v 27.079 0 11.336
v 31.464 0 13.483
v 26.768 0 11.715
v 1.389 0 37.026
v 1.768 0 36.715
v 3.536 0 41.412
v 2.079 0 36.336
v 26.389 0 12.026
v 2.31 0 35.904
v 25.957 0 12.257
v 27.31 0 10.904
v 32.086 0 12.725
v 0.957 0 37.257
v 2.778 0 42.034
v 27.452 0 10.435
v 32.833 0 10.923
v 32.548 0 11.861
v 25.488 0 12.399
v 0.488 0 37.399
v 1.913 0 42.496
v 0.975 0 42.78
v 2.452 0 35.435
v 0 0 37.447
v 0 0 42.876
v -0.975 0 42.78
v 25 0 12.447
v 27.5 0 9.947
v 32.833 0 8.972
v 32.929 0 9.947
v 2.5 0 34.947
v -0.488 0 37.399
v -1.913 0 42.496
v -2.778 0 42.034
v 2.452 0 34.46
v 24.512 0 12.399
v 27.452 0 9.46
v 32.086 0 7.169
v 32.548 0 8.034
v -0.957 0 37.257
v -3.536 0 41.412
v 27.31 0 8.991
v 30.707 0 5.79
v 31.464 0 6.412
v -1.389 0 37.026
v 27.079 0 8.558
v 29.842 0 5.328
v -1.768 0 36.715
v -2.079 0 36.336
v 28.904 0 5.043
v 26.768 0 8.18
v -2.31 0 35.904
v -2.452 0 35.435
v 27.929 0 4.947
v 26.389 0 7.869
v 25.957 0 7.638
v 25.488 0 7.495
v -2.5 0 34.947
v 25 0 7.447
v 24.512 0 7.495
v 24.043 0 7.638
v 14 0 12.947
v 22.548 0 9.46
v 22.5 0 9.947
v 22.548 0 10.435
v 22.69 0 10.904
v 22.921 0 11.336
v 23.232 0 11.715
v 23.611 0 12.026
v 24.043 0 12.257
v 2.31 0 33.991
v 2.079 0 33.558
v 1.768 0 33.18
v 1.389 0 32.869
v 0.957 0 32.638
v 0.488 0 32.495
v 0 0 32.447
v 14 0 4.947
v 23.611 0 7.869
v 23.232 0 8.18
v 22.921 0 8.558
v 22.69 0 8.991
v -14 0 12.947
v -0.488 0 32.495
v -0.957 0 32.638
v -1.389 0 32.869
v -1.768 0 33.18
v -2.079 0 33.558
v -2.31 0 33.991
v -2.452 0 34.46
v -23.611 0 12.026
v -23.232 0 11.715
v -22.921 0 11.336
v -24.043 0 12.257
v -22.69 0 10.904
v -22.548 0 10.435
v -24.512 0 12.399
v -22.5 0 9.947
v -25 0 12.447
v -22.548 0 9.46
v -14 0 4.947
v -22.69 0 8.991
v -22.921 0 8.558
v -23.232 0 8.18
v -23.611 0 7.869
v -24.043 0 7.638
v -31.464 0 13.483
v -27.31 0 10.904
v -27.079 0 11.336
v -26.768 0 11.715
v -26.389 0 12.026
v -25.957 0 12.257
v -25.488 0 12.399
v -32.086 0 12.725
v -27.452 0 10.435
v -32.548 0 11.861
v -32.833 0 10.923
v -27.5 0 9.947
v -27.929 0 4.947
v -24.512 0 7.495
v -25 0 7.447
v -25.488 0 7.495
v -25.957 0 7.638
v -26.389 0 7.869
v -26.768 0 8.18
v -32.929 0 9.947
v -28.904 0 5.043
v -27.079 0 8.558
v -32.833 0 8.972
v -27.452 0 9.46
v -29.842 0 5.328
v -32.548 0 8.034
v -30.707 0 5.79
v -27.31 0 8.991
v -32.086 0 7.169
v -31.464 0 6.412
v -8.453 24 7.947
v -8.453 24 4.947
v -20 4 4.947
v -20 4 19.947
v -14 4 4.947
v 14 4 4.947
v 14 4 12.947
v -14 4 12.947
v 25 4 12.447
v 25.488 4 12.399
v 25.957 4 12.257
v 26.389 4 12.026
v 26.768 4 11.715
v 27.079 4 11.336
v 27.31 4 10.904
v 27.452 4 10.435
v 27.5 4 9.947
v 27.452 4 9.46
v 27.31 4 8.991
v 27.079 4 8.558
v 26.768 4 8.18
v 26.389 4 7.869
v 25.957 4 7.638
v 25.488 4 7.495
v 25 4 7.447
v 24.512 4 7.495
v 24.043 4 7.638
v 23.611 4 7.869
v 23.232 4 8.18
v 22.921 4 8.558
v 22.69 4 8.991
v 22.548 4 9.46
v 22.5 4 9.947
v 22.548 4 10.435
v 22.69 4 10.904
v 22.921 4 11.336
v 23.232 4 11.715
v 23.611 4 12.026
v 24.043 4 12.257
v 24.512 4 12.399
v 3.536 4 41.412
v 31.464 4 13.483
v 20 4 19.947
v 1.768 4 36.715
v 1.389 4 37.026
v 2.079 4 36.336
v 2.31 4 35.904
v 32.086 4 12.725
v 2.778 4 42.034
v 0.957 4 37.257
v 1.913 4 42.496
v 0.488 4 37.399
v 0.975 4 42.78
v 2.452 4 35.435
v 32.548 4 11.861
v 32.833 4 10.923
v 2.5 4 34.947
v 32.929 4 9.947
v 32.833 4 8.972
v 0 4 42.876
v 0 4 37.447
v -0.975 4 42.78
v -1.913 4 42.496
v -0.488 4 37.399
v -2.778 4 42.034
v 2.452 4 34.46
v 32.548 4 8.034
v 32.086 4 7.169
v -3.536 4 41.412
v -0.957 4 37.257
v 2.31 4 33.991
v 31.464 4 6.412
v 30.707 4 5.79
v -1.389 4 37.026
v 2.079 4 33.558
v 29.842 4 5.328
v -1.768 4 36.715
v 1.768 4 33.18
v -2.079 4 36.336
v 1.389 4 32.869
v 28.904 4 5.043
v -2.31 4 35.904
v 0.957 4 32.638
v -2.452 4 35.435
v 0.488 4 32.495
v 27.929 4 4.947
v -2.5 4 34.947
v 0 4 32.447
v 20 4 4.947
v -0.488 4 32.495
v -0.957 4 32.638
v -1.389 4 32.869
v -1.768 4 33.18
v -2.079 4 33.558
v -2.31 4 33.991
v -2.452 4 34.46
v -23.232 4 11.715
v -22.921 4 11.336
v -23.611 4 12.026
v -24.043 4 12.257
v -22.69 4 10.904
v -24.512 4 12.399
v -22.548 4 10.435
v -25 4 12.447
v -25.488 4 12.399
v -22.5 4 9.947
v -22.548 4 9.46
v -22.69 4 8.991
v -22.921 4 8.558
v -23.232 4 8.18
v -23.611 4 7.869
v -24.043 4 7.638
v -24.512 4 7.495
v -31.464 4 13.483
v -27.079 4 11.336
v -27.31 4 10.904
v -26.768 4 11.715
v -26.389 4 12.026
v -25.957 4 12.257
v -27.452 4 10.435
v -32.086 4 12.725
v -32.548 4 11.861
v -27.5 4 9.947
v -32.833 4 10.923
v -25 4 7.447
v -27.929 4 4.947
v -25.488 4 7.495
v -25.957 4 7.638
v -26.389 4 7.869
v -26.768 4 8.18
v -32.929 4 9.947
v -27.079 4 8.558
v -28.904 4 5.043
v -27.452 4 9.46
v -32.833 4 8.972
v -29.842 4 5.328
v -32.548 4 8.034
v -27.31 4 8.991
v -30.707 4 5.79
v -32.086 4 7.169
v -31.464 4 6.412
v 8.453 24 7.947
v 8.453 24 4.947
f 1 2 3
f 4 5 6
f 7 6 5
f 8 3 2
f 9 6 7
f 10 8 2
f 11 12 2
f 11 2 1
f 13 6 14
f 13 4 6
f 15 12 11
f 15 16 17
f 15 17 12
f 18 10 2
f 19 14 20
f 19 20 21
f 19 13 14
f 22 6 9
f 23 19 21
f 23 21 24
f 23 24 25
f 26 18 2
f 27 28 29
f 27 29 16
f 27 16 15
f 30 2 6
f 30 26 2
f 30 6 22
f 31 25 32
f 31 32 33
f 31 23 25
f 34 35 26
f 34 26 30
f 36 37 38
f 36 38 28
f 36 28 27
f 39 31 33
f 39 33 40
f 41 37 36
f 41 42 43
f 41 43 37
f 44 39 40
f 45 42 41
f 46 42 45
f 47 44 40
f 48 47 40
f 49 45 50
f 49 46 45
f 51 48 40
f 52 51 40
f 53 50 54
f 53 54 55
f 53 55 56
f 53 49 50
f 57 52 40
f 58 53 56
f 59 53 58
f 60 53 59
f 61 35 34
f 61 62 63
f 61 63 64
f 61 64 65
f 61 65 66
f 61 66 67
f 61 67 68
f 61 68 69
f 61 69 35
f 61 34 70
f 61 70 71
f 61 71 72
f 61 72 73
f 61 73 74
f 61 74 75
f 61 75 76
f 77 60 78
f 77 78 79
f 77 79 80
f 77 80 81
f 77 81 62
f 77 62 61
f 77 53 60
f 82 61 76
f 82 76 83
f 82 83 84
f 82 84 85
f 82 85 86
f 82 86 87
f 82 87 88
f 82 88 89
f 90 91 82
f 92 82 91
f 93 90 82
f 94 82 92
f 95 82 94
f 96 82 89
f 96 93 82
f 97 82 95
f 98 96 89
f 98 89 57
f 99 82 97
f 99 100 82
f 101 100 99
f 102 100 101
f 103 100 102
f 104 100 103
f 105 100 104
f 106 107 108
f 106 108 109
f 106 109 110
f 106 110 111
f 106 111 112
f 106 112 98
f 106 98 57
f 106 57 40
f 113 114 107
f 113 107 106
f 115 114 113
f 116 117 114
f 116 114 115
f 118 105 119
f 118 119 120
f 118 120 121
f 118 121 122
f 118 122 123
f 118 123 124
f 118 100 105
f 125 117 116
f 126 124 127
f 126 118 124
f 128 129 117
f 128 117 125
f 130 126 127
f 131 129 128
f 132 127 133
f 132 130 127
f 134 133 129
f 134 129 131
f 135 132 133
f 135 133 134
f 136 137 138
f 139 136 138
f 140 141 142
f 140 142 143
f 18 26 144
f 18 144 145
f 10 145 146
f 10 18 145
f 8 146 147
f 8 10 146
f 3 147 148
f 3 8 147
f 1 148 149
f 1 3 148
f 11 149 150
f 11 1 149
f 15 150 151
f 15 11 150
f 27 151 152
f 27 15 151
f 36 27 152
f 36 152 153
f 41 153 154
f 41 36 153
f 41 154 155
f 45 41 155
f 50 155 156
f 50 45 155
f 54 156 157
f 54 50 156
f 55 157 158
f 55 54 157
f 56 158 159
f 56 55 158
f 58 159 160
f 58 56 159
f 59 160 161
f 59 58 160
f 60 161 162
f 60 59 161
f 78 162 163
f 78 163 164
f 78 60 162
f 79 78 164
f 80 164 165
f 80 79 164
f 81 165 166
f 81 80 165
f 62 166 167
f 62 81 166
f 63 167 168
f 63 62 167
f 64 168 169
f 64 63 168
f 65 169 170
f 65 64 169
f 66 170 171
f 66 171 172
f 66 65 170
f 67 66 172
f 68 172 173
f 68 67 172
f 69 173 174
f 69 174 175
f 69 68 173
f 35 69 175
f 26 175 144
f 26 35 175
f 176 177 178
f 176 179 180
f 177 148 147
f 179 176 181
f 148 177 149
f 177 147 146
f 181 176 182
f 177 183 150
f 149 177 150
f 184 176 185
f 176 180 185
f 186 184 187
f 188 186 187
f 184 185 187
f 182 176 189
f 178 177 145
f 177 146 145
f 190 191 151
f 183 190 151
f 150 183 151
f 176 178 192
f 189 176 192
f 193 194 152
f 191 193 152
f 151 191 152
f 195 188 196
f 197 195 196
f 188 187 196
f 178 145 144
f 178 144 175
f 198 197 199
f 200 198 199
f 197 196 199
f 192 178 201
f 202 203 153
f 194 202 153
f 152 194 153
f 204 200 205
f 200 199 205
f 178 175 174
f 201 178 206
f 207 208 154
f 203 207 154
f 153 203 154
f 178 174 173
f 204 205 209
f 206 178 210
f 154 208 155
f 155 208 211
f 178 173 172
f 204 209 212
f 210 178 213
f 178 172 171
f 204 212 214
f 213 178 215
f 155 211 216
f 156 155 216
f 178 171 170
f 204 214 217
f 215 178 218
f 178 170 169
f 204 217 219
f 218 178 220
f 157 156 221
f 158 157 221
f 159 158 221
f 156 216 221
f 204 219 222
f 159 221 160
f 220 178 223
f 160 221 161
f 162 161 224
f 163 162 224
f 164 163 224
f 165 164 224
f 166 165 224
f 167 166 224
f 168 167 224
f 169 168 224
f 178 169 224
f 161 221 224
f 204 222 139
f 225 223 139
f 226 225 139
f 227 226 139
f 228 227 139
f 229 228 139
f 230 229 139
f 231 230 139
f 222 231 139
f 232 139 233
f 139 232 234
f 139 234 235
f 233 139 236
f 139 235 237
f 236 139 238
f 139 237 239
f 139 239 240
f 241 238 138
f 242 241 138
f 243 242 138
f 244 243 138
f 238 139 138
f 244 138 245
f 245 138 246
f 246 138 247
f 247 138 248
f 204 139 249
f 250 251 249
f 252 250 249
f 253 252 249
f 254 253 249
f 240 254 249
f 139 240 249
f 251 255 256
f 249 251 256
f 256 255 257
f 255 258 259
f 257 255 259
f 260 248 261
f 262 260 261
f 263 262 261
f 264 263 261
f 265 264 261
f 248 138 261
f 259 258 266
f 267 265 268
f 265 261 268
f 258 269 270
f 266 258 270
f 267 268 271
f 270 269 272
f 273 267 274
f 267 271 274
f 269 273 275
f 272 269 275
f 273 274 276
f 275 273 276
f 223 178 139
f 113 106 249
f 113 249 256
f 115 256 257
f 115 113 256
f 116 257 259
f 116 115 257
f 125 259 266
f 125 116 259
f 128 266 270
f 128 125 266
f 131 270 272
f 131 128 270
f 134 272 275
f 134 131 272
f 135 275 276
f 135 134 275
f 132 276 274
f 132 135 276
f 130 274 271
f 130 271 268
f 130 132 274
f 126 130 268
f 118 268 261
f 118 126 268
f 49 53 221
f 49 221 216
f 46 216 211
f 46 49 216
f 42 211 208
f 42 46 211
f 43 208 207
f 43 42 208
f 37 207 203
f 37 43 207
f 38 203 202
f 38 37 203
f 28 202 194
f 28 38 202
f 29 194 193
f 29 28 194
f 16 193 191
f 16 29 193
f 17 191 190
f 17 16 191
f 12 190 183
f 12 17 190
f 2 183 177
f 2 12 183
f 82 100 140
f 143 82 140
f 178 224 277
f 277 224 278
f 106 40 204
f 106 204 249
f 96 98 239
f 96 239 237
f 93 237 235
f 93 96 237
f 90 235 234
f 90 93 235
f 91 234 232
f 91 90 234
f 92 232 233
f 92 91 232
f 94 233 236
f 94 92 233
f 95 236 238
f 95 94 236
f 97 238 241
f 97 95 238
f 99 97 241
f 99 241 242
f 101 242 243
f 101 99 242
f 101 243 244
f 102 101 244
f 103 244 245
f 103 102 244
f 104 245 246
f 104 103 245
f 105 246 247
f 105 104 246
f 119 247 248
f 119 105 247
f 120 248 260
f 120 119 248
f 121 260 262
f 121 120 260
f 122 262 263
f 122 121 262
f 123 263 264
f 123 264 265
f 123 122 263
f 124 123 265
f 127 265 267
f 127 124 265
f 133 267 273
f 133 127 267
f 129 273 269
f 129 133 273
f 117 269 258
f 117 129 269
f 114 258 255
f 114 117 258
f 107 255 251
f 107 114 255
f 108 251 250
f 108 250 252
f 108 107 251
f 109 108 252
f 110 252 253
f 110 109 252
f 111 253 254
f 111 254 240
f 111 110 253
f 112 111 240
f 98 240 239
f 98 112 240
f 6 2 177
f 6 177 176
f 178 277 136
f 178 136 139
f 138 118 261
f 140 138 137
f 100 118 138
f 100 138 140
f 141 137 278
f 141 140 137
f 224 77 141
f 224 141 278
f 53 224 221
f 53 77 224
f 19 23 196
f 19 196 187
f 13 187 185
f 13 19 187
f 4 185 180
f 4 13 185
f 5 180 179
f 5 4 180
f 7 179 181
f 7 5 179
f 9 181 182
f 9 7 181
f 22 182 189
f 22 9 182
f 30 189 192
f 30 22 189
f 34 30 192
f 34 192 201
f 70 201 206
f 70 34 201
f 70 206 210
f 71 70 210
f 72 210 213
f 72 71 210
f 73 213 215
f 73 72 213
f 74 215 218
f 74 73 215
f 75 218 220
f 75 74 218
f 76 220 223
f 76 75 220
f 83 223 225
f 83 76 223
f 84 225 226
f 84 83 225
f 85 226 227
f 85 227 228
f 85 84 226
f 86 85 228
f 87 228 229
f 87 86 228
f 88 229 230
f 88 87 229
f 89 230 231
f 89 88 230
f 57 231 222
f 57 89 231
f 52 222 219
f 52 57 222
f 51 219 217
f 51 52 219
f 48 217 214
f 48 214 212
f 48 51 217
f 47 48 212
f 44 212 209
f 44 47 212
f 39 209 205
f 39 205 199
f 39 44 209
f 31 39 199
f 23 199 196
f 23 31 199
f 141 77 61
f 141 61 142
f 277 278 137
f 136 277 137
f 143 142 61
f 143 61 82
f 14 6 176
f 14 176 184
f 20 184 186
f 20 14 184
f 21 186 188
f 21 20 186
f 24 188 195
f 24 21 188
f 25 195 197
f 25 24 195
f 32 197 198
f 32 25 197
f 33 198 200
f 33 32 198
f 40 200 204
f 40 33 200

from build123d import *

# Parameters (mm, degrees)
SKETCH_1_R               = 2.5
EXTRUDE_1_DEPTH          = 4
EXTRUDE_2_DEPTH          = 15
SKETCH_3_W               = 28
SKETCH_3_H               = 4
CUT_EXTRUDE_1_DEPTH      = 8
CUT_EXTRUDE_2_DEPTH      = 60.149678768
CUT_EXTRUDE_2_DEPTH_BACK = 60.149678768


with BuildPart() as part:
    # 草图1 → 凸台-拉伸1 (new body)
    with BuildSketch(Plane(origin=(0, 0, 0), x_dir=(1, 0, 0), z_dir=(0, 1, 0))):
        with BuildLine():
            Line((-27.928932188, -4.947284101), (27.928932188, -4.947284101))
            ThreePointArc((27.928932188, -4.947284101), (32.548329851, -8.03386694), (31.464466094, -13.482818007))
            Line((31.464466094, -13.482818007), (3.535533906, -41.411750195))
            ThreePointArc((3.535533906, -41.411750195), (0, -42.87621629), (-3.535533906, -41.411750195))
            Line((-3.535533906, -41.411750195), (-31.464466094, -13.482818007))
            ThreePointArc((-31.464466094, -13.482818007), (-32.548329851, -8.03386694), (-27.928932188, -4.947284101))
        make_face()
        with Locations(Location((-25, -9.947284101, 0), (0, 0, 270))):
            Circle(SKETCH_1_R, mode=Mode.SUBTRACT)
        with Locations(Location((25, -9.947284101, 0), (0, 0, 270))):
            Circle(SKETCH_1_R, mode=Mode.SUBTRACT)
        with Locations(Location((0, -34.947284101, 0), (0, 0, 270))):
            Circle(SKETCH_1_R, mode=Mode.SUBTRACT)
    extrude(amount=EXTRUDE_1_DEPTH)

    # 草图2 → 凸台-拉伸2 (add)
    with BuildSketch(Plane(origin=(0, 0, 4.947284101), x_dir=(-1, 0, 0), z_dir=(0, 0, -1))):
        Polygon((-20, 4), (-8.452994616, 24), (8.452994616, 24), (20, 4), align=None)
    extrude(amount=-EXTRUDE_2_DEPTH)

    # 草图3 → 切除-拉伸1 (cut)
    with BuildSketch(Plane(origin=(0, 0, 4.947284101), x_dir=(-1, 0, 0), z_dir=(0, 0, -1))):
        with Locations((0, 2)):
            Rectangle(SKETCH_3_W, SKETCH_3_H)
    extrude(amount=-CUT_EXTRUDE_1_DEPTH, mode=Mode.SUBTRACT)

    # 草图4 → 切除-拉伸2 (cut, two sides: drawn at the far end of the back side and taken through both)
    with BuildSketch(Plane(origin=(0, 0, 0), x_dir=(0, 0, -1), z_dir=(1, 0, 0)).offset(-CUT_EXTRUDE_2_DEPTH_BACK)):
        Polygon((-19.947284101, 24), (-7.947284101, 24), (-19.947284101, 4), align=None)
    extrude(amount=CUT_EXTRUDE_2_DEPTH + CUT_EXTRUDE_2_DEPTH_BACK, mode=Mode.SUBTRACT)


solid = part.part
